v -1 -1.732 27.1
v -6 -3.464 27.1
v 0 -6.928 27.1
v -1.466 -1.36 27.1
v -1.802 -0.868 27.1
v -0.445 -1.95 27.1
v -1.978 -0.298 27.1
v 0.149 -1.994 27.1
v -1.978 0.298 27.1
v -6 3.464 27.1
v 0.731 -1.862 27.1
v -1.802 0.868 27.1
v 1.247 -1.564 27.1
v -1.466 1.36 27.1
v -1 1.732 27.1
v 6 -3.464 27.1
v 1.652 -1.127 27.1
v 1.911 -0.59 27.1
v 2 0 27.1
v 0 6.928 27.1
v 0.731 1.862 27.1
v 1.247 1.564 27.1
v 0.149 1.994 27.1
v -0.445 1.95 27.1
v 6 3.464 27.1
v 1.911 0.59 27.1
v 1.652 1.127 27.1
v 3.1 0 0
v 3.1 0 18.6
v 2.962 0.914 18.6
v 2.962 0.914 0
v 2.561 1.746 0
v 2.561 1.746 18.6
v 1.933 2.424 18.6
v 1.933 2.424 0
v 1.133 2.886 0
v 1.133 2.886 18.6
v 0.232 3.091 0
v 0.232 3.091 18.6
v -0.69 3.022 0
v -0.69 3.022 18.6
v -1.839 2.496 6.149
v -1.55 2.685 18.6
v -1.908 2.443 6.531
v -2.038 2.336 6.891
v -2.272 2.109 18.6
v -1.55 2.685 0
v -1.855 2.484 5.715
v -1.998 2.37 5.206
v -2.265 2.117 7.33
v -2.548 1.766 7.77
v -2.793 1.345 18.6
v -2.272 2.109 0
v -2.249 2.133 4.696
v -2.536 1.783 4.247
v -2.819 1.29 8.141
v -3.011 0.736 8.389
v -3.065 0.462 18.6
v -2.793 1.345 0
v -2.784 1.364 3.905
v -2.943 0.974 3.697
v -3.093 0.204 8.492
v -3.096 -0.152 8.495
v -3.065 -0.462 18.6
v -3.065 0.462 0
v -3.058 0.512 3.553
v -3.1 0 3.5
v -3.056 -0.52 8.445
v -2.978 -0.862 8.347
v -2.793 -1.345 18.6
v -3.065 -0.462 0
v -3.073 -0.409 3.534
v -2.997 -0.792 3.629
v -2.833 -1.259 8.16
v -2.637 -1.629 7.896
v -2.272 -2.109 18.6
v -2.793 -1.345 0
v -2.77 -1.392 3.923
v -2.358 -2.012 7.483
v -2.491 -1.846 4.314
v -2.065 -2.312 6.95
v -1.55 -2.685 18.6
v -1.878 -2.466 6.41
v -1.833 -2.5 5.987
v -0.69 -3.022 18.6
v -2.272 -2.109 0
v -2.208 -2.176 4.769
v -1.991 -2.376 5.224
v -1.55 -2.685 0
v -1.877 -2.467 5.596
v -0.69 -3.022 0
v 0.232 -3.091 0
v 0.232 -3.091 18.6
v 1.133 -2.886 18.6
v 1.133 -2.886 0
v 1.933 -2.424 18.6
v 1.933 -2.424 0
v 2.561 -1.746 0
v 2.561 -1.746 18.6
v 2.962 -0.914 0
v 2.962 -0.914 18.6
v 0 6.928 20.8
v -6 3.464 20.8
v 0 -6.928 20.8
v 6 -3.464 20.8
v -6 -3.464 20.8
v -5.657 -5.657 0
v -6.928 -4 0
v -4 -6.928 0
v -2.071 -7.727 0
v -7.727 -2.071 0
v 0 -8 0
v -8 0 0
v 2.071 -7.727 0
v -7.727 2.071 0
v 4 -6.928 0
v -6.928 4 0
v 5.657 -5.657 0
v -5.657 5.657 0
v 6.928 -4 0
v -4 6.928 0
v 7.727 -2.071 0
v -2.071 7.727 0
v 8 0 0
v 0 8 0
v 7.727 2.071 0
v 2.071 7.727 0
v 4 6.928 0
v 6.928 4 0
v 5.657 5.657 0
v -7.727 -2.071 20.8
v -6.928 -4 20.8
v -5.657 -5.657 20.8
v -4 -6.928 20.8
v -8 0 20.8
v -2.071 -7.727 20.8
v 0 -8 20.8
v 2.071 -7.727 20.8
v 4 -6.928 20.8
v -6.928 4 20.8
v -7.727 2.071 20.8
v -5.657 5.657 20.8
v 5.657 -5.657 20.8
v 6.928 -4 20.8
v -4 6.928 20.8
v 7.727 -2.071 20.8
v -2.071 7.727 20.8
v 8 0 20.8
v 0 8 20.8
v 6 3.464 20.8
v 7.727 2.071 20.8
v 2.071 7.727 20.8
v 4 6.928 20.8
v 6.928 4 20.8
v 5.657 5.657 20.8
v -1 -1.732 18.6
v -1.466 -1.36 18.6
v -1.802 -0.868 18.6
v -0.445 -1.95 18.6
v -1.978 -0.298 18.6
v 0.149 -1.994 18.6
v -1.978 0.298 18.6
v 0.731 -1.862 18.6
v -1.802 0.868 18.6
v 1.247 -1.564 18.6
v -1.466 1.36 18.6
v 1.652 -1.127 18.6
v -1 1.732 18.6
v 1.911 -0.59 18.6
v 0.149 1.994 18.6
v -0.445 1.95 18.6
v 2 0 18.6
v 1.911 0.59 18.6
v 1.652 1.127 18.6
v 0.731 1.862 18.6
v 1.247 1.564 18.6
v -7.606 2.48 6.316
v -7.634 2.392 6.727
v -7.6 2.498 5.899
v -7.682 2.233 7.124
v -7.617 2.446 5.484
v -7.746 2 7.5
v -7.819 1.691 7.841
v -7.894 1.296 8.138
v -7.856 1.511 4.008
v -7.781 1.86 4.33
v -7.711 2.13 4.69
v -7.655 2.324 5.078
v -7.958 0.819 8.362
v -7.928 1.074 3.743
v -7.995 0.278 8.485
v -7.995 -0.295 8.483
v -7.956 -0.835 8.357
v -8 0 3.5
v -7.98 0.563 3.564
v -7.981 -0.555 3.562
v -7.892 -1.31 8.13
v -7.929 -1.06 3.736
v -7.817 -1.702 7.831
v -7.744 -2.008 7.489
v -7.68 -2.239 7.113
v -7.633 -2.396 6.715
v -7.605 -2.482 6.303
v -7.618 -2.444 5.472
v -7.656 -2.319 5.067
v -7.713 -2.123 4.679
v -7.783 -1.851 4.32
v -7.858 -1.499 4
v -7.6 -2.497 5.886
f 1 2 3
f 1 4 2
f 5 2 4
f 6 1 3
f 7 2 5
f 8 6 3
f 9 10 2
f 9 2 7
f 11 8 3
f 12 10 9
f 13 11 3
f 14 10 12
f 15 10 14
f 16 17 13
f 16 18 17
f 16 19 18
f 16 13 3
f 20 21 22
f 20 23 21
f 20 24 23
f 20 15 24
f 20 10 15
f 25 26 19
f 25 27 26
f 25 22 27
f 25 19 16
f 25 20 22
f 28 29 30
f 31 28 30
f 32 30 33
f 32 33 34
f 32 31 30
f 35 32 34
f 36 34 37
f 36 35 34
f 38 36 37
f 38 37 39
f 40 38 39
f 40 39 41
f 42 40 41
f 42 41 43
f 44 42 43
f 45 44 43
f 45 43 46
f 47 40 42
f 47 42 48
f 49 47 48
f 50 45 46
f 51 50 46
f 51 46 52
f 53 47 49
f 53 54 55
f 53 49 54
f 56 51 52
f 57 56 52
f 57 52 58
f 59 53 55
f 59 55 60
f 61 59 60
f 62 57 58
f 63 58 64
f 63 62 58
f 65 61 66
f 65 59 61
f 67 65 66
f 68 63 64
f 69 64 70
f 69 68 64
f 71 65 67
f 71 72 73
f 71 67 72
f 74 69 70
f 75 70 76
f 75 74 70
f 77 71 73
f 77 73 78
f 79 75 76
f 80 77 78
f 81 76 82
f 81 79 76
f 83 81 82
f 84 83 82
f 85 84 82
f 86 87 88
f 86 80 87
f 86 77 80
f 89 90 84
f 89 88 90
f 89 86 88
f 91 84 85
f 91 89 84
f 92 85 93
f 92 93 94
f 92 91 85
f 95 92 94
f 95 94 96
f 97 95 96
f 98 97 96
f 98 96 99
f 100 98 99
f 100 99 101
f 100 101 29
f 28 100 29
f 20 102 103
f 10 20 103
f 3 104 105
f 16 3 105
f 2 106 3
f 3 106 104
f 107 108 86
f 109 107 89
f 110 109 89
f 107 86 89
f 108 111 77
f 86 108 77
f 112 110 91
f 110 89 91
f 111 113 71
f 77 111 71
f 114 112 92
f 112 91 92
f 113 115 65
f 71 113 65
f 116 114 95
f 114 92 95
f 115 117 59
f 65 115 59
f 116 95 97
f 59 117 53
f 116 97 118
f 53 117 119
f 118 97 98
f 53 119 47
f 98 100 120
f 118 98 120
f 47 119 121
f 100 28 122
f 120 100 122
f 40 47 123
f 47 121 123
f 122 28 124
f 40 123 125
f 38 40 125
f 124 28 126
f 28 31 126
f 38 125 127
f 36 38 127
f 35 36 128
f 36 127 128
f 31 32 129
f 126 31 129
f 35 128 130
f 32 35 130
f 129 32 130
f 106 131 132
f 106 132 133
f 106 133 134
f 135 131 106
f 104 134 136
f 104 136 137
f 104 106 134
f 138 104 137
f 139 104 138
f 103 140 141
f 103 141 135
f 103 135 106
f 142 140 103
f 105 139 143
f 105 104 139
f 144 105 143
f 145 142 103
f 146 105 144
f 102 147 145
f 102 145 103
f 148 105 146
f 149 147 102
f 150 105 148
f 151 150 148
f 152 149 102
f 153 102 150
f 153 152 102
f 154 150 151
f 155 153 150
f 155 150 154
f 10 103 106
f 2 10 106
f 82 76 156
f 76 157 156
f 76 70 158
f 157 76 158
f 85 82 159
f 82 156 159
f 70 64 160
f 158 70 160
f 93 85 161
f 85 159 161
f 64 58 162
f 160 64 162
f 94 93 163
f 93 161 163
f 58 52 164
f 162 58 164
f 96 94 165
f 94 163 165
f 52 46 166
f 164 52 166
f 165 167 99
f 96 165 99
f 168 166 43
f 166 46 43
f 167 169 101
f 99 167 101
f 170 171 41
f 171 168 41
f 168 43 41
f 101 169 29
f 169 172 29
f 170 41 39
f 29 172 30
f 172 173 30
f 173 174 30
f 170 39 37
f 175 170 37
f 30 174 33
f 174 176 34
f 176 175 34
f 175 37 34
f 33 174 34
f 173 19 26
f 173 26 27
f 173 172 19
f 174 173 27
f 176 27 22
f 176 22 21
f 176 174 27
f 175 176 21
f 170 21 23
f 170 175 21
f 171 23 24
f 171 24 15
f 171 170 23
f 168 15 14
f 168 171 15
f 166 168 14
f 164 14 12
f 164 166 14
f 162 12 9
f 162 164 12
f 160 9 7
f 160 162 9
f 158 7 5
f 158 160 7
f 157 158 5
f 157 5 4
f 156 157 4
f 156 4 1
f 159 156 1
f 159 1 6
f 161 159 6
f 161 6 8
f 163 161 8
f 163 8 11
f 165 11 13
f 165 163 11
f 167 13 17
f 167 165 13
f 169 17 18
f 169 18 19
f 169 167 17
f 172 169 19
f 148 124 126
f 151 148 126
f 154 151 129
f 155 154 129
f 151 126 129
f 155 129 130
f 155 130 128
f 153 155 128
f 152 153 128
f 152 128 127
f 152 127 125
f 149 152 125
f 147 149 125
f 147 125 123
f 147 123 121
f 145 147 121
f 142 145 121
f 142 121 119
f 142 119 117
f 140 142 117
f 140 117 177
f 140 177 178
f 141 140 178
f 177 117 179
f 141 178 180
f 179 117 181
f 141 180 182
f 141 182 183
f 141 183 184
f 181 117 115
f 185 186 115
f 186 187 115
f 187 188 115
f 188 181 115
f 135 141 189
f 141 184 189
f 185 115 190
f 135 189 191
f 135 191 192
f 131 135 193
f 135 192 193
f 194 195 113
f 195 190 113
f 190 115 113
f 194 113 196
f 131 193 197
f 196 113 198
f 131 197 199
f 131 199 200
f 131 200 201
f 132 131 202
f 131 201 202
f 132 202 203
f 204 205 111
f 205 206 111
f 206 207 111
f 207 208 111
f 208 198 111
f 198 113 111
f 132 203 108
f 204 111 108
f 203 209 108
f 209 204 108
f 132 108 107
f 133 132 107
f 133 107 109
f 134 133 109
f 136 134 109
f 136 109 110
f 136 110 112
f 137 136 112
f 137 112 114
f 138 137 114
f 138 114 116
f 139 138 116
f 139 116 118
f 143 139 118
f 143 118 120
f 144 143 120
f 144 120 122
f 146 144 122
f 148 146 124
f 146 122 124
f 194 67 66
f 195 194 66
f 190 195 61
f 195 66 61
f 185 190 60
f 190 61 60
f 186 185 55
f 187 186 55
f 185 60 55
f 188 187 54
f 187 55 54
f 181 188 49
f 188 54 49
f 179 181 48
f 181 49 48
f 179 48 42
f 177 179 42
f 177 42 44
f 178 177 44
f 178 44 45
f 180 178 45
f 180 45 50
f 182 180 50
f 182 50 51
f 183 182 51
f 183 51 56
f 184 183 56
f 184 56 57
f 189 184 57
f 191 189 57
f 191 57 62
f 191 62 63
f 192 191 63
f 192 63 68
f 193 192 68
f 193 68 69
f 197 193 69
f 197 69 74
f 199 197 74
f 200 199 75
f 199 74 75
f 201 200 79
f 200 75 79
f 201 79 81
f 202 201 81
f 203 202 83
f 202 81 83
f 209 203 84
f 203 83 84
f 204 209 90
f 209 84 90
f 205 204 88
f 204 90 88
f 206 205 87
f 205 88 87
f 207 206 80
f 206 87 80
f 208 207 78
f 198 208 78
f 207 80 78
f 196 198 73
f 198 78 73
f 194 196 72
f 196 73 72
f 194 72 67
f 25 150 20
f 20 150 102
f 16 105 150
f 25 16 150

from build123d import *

# Parameters (mm, degrees)
CROQUIS1_R              = 8
CROQUIS1_R_2            = 3.1
SALIENTE_EXTRUIR1_DEPTH = 20.8
CROQUIS2_R              = 3.1
CROQUIS2_R_2            = 2
SALIENTE_EXTRUIR2_DEPTH = 2.2
CROQUIS3_R              = 2
SALIENTE_EXTRUIR3_DEPTH = 6.3
CORTAR_EXTRUIR1_REACH   = 10
CROQUIS4_R              = 2.5


with BuildPart() as part:
    # Croquis1 → Saliente-Extruir1 (new body)
    with BuildSketch(Plane.XY):
        Circle(CROQUIS1_R)
        Circle(CROQUIS1_R_2, mode=Mode.SUBTRACT)
    extrude(amount=SALIENTE_EXTRUIR1_DEPTH)

    # Croquis2 → Saliente-Extruir2 (add)
    with BuildSketch(Plane.XY.offset(20.8)):
        Circle(CROQUIS2_R)
        Circle(CROQUIS2_R_2, mode=Mode.SUBTRACT)
    extrude(amount=-SALIENTE_EXTRUIR2_DEPTH)

    # Croquis3 → Saliente-Extruir3 (add)
    with BuildSketch(Plane.XY.offset(20.8)):
        Polygon((0, 6.92820323), (-6, 3.464101615), (-6, -3.464101615), (0, -6.92820323), (6, -3.464101615), (6, 3.464101615), align=None)
        Circle(CROQUIS3_R, mode=Mode.SUBTRACT)
    extrude(amount=SALIENTE_EXTRUIR3_DEPTH)

    # Croquis4 → Cortar-Extruir1 (cut, up to next)
    with BuildSketch(Plane(origin=(0, 0, 0), x_dir=(0, 0, -1), z_dir=(1, 0, 0)), mode=Mode.PRIVATE) as cortar_extruir1_sk1:
        with Locations((-6, 0)):
            Circle(CROQUIS4_R)
    cortar_extruir1_tool1 = extrude(cortar_extruir1_sk1.sketch, amount=-CORTAR_EXTRUIR1_REACH, mode=Mode.PRIVATE) & part.part
    add(cortar_extruir1_tool1.solids().sort_by_distance((0, 0, 6))[0], mode=Mode.SUBTRACT)


solid = part.part
